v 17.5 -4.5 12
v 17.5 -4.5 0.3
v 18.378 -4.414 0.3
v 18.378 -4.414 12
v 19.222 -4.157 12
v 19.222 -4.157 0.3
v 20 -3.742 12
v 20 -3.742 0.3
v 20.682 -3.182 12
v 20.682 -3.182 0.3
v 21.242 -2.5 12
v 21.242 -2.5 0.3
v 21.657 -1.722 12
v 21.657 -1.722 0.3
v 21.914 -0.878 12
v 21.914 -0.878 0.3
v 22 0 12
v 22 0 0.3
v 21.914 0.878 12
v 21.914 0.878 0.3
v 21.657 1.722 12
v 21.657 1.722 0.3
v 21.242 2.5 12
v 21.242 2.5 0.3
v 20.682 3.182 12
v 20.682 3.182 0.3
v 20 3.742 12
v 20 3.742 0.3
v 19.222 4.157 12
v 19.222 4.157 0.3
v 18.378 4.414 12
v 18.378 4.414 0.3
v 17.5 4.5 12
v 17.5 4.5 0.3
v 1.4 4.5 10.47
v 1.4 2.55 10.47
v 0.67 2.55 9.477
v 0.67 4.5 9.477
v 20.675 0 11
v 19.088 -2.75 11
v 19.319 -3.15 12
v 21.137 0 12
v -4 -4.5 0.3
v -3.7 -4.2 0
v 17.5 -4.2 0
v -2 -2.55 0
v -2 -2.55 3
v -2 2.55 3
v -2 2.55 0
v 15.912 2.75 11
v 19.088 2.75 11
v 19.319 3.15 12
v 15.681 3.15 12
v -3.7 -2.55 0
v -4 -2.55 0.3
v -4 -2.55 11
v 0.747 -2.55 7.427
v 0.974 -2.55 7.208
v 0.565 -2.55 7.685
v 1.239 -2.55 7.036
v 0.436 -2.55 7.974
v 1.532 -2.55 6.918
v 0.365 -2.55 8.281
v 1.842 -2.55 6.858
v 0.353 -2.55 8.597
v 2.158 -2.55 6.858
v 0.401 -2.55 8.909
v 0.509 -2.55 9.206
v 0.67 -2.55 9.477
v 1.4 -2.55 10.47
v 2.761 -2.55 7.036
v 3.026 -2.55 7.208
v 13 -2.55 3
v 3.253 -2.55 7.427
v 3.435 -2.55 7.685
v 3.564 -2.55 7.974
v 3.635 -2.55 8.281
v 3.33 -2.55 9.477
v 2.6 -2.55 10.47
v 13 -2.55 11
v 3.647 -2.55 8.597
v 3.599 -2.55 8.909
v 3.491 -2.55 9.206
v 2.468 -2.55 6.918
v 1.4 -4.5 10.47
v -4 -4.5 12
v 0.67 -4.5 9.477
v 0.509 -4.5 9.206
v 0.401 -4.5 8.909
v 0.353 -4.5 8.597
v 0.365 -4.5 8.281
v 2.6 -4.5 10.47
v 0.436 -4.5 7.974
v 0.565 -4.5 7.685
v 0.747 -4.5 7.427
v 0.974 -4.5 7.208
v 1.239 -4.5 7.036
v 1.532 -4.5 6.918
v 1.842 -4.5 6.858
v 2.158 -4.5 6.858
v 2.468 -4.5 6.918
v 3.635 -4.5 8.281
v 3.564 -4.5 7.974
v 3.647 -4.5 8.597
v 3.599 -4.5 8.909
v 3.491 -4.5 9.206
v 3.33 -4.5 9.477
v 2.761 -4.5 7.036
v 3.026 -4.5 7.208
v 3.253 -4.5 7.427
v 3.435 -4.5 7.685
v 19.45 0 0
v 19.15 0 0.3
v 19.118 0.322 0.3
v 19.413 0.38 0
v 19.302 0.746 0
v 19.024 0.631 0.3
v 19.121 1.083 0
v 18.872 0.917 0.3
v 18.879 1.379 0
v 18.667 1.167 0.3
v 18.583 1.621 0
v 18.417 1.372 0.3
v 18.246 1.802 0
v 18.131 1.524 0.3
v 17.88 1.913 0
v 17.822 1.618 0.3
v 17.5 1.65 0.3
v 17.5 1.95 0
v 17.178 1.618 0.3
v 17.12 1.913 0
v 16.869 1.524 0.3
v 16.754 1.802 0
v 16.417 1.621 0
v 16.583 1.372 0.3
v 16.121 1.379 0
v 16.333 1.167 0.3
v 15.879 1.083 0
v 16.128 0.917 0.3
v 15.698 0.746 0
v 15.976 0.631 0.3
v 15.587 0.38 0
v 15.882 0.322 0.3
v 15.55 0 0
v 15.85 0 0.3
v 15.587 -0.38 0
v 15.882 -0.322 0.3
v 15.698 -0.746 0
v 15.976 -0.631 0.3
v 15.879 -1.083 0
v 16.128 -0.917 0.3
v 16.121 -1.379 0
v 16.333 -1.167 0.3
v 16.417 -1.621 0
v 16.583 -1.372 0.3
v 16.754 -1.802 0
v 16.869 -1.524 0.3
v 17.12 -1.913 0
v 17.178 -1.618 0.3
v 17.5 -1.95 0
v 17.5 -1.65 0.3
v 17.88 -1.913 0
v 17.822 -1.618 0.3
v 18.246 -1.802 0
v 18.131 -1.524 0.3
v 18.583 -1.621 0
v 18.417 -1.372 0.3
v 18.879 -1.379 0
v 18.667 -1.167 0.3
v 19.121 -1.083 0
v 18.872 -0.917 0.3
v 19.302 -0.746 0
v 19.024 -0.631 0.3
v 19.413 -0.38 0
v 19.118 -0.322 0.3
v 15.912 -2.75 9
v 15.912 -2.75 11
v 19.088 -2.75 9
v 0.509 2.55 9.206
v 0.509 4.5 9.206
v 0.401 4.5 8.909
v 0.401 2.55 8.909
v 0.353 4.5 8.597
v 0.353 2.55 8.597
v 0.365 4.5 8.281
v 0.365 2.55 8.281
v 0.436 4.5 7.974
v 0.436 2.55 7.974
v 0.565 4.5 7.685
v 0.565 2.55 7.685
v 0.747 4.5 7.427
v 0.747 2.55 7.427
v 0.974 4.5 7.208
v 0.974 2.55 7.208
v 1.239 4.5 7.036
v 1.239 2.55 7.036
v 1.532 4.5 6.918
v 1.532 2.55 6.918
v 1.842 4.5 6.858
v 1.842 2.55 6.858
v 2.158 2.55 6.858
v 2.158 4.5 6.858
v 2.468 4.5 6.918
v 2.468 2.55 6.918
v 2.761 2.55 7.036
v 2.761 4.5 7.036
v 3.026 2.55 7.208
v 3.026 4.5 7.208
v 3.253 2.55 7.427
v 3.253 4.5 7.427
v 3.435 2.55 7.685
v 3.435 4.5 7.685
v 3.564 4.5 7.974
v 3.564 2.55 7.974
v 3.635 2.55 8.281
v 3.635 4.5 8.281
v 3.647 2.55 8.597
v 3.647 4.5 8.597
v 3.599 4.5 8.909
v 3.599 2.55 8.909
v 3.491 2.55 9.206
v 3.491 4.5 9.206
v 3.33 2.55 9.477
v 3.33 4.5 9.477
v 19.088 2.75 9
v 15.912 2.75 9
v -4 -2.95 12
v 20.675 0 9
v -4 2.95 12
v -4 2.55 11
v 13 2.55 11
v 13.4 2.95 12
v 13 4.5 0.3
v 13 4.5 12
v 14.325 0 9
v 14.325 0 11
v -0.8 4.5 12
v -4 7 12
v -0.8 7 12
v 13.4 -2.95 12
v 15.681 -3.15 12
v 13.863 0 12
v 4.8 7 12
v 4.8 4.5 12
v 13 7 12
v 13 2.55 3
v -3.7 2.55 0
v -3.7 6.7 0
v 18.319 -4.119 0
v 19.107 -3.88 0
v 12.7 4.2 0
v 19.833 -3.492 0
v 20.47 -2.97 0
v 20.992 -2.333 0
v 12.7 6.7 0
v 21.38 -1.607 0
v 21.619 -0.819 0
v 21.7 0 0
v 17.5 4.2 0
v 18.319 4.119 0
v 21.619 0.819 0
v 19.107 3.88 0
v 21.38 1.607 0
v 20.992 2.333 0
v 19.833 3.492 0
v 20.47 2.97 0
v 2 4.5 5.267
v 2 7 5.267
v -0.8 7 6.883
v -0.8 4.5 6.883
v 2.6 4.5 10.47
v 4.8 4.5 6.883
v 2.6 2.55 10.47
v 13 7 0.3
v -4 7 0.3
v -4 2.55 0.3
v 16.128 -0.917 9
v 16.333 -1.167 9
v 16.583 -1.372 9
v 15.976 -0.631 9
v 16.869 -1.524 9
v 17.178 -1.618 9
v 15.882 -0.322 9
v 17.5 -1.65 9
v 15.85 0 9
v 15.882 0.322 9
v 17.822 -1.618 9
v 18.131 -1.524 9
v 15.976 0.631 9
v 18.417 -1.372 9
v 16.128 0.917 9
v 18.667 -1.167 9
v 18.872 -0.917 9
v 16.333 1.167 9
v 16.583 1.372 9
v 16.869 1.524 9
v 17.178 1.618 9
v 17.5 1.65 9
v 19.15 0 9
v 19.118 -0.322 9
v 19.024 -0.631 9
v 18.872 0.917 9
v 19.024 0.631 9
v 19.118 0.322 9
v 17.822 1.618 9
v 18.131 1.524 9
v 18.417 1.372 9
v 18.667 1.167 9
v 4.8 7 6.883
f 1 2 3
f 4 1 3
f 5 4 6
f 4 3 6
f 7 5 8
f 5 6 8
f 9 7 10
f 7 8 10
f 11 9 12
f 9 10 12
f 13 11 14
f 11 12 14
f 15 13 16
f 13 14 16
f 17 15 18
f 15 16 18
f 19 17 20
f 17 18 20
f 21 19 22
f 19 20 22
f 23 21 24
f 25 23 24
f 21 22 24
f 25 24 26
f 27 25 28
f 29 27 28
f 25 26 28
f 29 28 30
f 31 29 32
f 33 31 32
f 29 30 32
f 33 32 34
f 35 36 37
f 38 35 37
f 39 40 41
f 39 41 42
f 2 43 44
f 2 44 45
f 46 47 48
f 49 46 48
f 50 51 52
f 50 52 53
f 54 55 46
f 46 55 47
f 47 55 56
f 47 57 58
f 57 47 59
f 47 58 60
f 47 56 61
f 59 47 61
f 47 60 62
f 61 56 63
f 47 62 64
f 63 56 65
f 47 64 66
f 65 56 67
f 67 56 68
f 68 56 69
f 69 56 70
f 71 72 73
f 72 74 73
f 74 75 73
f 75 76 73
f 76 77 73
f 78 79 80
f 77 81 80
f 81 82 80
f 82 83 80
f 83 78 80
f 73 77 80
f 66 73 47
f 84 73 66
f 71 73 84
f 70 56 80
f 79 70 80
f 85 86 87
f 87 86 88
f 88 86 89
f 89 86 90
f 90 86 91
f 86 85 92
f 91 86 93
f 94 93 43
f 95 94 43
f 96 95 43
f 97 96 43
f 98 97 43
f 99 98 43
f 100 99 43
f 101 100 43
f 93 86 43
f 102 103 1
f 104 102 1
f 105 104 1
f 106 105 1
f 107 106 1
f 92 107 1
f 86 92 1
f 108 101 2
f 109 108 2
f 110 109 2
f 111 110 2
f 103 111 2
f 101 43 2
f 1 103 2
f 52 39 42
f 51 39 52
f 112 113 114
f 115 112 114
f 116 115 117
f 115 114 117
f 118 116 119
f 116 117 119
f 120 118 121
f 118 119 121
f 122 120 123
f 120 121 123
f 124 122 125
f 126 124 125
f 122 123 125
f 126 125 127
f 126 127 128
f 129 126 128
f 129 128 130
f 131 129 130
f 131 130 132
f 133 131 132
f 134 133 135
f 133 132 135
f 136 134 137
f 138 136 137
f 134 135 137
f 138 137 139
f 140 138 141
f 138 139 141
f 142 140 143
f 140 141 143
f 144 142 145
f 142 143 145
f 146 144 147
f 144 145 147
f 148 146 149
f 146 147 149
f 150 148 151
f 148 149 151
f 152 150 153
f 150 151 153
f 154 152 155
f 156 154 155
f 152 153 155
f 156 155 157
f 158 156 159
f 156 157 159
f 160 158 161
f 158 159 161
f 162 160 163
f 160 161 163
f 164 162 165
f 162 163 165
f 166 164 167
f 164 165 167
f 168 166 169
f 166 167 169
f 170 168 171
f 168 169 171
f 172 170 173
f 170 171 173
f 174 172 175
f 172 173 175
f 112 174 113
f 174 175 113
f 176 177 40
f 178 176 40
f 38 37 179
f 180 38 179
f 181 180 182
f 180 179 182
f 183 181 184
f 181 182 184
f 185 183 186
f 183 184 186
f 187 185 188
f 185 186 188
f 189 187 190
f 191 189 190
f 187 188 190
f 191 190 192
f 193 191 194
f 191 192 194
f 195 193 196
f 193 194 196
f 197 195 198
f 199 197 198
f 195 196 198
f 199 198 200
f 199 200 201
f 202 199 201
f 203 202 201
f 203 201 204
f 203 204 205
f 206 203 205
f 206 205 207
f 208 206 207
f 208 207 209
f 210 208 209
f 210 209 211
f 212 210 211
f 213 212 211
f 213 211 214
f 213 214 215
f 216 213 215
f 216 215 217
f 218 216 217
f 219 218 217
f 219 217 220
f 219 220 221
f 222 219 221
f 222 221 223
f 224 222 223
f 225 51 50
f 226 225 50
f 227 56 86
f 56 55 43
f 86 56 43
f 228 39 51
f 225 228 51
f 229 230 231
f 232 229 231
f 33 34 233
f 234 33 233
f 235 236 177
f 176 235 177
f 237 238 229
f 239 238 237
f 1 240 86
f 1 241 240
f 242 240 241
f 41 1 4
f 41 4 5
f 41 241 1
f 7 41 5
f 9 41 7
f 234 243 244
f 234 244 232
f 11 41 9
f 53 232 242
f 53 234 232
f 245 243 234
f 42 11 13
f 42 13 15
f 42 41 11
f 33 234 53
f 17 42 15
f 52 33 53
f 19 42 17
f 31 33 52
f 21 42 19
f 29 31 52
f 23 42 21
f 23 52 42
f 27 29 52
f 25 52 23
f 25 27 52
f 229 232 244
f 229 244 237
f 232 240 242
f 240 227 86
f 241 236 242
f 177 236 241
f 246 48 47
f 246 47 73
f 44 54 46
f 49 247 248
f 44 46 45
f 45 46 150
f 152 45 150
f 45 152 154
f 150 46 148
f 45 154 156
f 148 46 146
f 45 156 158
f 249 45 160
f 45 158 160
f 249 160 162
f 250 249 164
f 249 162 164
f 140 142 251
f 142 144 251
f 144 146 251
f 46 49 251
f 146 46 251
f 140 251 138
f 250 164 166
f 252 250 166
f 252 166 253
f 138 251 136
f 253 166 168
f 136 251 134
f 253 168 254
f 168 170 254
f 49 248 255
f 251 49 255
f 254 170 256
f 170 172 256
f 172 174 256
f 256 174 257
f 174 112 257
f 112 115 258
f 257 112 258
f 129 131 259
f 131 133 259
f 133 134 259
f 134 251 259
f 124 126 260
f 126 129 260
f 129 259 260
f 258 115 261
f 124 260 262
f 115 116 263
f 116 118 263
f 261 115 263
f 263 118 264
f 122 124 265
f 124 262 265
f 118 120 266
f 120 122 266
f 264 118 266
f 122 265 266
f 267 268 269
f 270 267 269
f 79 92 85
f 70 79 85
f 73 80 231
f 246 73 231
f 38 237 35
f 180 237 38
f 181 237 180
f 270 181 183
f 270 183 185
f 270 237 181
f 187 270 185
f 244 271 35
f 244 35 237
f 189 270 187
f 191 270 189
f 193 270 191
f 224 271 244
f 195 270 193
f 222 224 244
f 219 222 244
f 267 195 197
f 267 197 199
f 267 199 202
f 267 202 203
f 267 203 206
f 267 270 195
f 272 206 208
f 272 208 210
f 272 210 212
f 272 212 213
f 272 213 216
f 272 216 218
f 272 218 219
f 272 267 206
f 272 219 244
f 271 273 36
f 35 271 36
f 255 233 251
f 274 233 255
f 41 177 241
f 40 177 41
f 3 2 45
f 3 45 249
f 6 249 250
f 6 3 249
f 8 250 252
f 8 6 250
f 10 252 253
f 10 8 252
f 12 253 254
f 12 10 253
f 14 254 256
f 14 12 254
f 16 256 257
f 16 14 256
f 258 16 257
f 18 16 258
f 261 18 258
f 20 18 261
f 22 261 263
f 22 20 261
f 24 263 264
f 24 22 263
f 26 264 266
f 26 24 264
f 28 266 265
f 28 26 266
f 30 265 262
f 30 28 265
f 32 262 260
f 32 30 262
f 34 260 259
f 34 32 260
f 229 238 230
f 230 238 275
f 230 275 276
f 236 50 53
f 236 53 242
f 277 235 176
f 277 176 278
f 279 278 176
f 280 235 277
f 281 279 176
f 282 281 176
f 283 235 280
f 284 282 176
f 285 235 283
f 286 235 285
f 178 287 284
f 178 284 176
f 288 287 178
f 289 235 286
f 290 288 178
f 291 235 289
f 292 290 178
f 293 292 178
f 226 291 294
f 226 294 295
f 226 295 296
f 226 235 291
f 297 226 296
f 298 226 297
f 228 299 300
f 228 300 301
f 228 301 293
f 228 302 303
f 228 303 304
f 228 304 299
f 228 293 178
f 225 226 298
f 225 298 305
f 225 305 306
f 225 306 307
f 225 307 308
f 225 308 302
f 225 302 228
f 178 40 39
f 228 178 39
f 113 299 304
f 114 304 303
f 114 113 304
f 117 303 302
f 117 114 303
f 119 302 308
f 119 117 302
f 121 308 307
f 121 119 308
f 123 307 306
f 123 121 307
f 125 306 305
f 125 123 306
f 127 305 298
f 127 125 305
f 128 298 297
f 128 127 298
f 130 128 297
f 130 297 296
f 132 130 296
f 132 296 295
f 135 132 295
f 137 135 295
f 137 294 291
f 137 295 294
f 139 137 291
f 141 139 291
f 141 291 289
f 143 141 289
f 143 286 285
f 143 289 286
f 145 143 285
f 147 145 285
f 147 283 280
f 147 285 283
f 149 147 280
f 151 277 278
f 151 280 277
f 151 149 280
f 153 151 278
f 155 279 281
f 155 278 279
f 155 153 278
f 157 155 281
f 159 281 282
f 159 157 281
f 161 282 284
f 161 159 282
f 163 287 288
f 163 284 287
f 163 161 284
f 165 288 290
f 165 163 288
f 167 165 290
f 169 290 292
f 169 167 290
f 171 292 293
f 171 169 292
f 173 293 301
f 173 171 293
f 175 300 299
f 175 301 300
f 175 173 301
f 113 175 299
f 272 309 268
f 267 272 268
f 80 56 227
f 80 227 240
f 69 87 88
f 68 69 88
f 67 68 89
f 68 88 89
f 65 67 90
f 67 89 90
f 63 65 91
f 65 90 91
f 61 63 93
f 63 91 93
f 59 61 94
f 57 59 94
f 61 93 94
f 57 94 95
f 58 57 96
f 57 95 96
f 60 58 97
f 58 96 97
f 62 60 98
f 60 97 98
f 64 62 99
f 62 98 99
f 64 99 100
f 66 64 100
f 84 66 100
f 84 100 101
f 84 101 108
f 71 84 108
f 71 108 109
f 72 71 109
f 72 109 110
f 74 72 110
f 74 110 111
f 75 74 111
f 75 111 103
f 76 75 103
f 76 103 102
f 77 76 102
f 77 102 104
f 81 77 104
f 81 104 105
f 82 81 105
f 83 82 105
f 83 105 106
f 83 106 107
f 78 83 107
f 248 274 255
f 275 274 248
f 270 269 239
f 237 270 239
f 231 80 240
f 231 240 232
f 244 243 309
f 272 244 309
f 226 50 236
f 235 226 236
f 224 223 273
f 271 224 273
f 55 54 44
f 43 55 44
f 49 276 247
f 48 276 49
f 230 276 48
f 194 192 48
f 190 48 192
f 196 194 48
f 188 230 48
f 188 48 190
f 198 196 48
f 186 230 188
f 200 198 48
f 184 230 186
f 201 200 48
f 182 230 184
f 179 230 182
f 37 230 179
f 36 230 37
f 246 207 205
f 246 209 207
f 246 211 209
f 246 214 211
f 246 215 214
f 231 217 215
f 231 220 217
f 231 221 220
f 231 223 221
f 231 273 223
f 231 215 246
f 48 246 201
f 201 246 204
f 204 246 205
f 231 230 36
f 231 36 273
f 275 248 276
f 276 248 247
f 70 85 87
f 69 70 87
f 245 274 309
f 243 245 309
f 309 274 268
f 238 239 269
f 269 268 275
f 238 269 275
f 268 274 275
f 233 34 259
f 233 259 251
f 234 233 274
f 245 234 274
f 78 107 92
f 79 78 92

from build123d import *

# Parameters (mm, degrees)
SKETCH1_R           = 1.65
BOSS_EXTRUDE1_DEPTH = 12
SKETCH2_W           = 17
SKETCH2_H           = 5.1
CUT_EXTRUDE1_DEPTH  = 9
CUT_EXTRUDE2_DEPTH  = 3
CHAMFER1_SIZE       = 0.4
CHAMFER1_SIZE2      = 1
CHAMFER2_SIZE       = 0.3
CUT_EXTRUDE3_DEPTH  = 12.5
CUT_EXTRUDE4_DEPTH  = 2.5
SKETCH6_W           = 2
SKETCH6_H           = 5.1
CUT_EXTRUDE5_DEPTH  = 4


with BuildPart() as part:
    # Sketch1 → Boss-Extrude1 (new body)
    with BuildSketch(Plane.XY):
        with BuildLine():
            Line((-4, 7), (-4, -4.5))
            Line((-4, -4.5), (17.5, -4.5))
            ThreePointArc((17.5, -4.5), (22, 0), (17.5, 4.5))
            Line((17.5, 4.5), (13, 4.5))
            Line((13, 4.5), (13, 7))
            Line((13, 7), (-4, 7))
        make_face()
        with Locations((17.5, 0)):
            Circle(SKETCH1_R, mode=Mode.SUBTRACT)
    extrude(amount=BOSS_EXTRUDE1_DEPTH)

    # Sketch2 → Cut-Extrude1 (cut)
    with BuildSketch(Plane.XY.offset(12)):
        with Locations((4.5, 0)):
            Rectangle(SKETCH2_W, SKETCH2_H)
    extrude(amount=-CUT_EXTRUDE1_DEPTH, mode=Mode.SUBTRACT)

    # Sketch3 → Cut-Extrude2 (cut)
    with BuildSketch(Plane.XY.offset(12)):
        Polygon((14.324573519, 0), (15.91228676, -2.75), (19.08771324, -2.75), (20.675426481, 0), (19.08771324, 2.75), (15.91228676, 2.75), align=None)
    extrude(amount=-CUT_EXTRUDE2_DEPTH, mode=Mode.SUBTRACT)

    # Chamfer1
    chamfer1_edges = [part.edges().sort_by_distance(p)[0] for p in [
        (4.5, -2.55, 12),
        (13, 0, 12),
        (4.5, 2.55, 12),
        (15.11843014, 1.375, 12),
        (15.11843014, -1.375, 12),
        (17.5, -2.75, 12),
        (19.88156986, -1.375, 12),
        (19.88156986, 1.375, 12),
        (17.5, 2.75, 12),
    ]]
    chamfer1_side = [part.faces().sort_by_distance(p)[0] for p in [
        (4.5, 6.71570262, 12),
    ]]
    chamfer(chamfer1_edges, length=CHAMFER1_SIZE, length2=CHAMFER1_SIZE2, reference=chamfer1_side[0])

    # Chamfer2
    chamfer2_edges = [part.edges().sort_by_distance(p)[0] for p in [
        (15.85, 0, 0),
        (22, 0, 0),
        (6.75, -4.5, 0),
        (-4, 1.25, 0),
        (4.5, 7, 0),
        (13, 5.75, 0),
        (15.25, 4.5, 0),
    ]]
    chamfer(chamfer2_edges, length=CHAMFER2_SIZE)

    # Sketch4 → Cut-Extrude3 (cut, through all)
    with BuildSketch(Plane(origin=(0, -4.5, 0), x_dir=(1, 0, 0), z_dir=(0, 1, 0))):
        with BuildLine():
            Line((3.329547877, -9.477139931), (2.599853793, -10.47))
            Line((2.599853793, -10.47), (1.400146207, -10.47))
            Line((1.400146207, -10.47), (0.670452123, -9.477139931))
            ThreePointArc((0.670452123, -9.477139931), (2, -6.85), (3.329547877, -9.477139931))
        make_face()
    extrude(amount=CUT_EXTRUDE3_DEPTH, mode=Mode.SUBTRACT)

    # Sketch5 → Cut-Extrude4 (cut)
    with BuildSketch(Plane(origin=(0, 7, 0), x_dir=(1, 0, 0), z_dir=(0, 1, 0))):
        Polygon((-0.8, -12), (4.8, -12), (4.8, -6.883419246), (2, -5.266838493), (-0.8, -6.883419246), align=None)
    extrude(amount=-CUT_EXTRUDE4_DEPTH, mode=Mode.SUBTRACT)

    # Sketch6 → Cut-Extrude5 (cut, through all)
    with BuildSketch(Plane.XY.offset(3)):
        with Locations((-3, 0)):
            Rectangle(SKETCH6_W, SKETCH6_H)
    extrude(amount=-CUT_EXTRUDE5_DEPTH, mode=Mode.SUBTRACT)


solid = part.part
